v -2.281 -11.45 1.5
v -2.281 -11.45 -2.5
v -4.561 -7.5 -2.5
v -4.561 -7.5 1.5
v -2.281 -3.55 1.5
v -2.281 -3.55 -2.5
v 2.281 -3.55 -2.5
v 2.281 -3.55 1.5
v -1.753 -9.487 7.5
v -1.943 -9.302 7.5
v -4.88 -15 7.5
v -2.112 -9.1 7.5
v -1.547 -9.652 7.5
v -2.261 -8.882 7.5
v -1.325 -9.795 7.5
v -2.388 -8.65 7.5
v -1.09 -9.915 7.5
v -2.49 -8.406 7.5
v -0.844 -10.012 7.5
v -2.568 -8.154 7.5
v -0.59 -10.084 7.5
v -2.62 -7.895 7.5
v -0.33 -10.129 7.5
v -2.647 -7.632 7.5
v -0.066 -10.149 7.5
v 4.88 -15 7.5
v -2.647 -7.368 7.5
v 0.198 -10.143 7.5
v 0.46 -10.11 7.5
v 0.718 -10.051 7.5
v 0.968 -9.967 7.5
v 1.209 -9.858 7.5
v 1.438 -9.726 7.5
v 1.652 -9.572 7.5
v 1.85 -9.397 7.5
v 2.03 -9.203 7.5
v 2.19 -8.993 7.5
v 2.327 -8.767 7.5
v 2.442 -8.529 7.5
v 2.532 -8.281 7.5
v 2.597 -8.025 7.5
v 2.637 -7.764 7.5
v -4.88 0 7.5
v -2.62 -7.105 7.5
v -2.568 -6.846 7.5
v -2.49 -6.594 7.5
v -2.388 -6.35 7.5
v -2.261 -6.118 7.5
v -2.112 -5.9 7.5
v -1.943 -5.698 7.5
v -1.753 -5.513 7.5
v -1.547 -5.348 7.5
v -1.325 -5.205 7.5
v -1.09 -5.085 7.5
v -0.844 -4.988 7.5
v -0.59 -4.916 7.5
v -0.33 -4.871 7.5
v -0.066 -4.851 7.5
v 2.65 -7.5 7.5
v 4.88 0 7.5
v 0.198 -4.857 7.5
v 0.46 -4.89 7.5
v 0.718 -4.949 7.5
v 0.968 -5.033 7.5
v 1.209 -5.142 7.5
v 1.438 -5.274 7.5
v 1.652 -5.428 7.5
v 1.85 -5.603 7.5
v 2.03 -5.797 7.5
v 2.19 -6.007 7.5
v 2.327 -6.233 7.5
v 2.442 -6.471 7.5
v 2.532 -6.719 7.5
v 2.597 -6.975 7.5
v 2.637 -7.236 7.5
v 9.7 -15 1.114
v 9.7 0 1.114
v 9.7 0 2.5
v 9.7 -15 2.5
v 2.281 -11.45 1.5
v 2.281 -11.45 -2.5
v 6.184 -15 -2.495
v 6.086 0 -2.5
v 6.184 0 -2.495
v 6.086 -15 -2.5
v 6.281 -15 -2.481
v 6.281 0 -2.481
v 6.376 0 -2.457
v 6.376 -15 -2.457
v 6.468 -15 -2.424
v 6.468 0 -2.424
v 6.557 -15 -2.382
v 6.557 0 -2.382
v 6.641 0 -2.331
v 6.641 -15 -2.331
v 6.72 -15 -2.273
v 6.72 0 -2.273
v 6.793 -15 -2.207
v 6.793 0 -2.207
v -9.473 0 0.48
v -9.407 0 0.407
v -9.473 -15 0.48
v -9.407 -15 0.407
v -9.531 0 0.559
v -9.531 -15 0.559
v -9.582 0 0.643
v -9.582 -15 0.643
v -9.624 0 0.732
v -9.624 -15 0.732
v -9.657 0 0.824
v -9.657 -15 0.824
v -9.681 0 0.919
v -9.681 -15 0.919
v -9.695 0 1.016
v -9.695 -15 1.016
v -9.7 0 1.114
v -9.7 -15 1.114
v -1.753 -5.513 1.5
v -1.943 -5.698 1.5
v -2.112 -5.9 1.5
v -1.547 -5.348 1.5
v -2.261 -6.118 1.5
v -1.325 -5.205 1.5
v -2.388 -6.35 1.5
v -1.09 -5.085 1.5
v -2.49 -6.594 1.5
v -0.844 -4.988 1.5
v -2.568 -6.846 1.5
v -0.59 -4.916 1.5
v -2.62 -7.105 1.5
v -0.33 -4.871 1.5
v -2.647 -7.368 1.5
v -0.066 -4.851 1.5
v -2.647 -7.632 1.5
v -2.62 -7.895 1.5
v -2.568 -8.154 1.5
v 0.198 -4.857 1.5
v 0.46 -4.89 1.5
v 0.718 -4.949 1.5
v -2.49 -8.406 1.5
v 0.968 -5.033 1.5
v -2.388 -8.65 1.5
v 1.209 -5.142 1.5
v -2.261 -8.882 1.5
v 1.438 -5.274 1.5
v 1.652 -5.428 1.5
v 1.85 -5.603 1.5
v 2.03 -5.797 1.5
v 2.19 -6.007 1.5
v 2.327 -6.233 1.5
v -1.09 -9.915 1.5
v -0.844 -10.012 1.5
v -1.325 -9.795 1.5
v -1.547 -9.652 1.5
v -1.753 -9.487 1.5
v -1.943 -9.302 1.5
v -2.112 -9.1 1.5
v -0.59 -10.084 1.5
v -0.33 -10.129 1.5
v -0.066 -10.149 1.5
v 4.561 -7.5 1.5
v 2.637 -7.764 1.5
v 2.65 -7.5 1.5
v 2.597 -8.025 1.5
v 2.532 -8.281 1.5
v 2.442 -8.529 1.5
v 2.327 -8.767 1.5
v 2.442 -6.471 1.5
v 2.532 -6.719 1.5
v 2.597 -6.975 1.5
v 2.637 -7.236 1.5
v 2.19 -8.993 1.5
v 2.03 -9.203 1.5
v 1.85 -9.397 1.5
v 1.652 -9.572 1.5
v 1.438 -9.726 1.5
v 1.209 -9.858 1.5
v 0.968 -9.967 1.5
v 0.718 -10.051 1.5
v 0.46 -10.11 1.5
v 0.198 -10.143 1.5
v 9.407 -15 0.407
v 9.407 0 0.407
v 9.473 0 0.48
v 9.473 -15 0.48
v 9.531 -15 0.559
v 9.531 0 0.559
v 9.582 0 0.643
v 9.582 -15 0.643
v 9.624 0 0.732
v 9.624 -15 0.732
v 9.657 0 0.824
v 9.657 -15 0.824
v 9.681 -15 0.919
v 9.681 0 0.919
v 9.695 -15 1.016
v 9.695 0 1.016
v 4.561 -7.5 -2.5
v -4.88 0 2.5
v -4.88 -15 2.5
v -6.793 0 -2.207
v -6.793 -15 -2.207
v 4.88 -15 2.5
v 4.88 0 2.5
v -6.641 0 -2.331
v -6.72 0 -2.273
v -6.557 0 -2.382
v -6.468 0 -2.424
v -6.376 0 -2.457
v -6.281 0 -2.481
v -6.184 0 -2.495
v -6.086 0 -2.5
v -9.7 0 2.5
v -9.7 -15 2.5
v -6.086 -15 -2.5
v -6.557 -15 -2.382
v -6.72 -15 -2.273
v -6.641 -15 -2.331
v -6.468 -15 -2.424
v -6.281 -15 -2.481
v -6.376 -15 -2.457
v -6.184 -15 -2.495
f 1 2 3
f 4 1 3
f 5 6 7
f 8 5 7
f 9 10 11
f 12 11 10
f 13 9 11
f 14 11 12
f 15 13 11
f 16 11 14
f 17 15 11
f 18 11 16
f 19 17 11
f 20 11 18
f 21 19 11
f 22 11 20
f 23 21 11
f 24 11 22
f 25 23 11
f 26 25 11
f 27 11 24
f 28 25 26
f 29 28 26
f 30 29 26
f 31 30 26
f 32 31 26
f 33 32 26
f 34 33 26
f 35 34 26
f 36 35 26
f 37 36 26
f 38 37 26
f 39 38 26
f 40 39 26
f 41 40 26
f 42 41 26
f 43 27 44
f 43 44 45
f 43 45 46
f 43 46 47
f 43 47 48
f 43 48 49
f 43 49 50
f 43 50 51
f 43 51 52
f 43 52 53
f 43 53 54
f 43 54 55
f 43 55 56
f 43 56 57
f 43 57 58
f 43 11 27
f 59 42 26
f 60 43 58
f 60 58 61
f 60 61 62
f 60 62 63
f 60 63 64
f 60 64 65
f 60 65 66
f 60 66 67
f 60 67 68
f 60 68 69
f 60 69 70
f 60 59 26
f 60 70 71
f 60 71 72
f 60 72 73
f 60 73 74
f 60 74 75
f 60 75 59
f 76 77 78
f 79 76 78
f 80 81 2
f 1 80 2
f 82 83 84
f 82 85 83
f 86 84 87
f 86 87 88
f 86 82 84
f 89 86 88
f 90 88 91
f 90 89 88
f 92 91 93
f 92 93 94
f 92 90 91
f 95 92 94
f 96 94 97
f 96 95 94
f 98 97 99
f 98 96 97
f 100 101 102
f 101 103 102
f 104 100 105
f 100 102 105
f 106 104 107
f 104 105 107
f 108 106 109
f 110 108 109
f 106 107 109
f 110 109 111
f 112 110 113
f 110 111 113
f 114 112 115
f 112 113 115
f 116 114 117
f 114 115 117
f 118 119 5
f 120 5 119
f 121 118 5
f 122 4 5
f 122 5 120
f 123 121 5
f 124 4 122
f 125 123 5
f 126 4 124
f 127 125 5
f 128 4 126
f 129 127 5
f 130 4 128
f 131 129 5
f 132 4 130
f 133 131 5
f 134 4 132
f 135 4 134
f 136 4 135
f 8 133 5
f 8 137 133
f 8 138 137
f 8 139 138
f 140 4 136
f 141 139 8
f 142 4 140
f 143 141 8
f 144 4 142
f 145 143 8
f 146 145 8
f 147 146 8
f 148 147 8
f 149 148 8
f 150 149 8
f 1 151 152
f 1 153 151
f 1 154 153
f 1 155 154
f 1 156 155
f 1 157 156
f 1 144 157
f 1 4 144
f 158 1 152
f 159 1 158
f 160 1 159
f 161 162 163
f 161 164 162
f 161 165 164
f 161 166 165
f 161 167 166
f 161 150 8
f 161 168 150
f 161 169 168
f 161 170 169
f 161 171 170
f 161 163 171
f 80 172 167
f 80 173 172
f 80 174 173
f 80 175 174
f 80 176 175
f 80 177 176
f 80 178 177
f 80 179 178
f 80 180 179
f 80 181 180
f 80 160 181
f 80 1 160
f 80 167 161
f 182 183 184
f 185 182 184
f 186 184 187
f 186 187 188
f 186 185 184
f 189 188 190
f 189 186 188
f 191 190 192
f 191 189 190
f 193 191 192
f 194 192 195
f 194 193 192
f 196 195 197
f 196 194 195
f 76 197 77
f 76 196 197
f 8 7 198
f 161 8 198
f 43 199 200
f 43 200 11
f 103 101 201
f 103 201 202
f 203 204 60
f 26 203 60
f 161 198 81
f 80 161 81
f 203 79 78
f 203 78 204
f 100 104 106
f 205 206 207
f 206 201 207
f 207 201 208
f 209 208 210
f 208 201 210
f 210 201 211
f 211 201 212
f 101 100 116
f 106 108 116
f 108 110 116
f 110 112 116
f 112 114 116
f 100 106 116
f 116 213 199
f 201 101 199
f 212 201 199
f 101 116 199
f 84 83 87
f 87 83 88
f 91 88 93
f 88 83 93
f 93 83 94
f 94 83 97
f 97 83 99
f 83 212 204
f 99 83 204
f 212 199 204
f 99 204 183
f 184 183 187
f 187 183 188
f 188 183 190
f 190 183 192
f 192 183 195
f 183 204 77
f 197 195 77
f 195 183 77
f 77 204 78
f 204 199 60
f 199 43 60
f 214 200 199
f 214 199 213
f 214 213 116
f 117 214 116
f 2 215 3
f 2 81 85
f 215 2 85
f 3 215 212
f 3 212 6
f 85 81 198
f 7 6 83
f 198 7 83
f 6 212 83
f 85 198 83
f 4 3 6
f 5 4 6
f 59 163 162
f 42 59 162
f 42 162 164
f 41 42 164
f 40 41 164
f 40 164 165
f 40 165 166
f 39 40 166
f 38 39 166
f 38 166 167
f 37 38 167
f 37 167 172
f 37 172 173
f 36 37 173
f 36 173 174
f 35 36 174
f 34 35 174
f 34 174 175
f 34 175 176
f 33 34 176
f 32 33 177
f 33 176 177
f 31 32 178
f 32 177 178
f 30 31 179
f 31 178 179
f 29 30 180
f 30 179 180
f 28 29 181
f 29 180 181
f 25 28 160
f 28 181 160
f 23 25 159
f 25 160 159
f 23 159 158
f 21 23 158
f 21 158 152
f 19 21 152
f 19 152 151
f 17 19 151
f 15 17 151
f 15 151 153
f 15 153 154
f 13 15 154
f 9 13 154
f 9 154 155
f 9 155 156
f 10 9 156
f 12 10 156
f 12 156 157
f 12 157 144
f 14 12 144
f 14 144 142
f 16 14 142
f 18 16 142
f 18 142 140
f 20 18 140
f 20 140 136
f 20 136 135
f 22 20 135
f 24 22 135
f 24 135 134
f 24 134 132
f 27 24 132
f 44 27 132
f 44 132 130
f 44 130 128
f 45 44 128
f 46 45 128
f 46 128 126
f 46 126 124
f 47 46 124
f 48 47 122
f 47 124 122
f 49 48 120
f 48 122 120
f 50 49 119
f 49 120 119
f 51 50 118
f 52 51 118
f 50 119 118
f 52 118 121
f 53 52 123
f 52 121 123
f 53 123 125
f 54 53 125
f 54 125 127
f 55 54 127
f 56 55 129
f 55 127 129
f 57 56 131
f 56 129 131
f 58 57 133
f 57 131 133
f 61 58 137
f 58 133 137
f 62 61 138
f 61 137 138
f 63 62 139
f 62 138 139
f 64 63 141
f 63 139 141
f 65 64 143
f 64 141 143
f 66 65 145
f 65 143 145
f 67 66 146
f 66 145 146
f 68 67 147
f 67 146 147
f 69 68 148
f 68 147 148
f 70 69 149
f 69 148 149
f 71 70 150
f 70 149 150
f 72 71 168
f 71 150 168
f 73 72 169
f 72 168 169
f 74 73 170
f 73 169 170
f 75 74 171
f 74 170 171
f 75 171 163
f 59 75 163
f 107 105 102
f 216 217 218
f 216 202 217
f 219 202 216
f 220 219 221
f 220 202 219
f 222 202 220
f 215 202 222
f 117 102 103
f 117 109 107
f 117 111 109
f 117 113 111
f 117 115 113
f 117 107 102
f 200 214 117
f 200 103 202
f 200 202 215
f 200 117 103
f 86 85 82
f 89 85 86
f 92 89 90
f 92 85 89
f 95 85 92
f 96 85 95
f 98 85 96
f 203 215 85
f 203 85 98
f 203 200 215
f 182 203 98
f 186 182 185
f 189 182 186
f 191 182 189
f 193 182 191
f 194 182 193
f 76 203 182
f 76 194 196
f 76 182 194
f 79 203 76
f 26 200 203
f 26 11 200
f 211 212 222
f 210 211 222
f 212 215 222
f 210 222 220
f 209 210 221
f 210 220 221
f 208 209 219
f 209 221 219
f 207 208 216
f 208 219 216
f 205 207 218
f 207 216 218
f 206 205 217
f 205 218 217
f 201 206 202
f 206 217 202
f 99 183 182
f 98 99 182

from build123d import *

# Parameters (mm, degrees)
F0_W     = 9.76
F0_H     = 5
F1_DEPTH = 15
F2_SIZE  = 3.2
F3_R     = 2.65
F4_DEPTH = 10.001
F5_DEPTH = 4
F6_R     = 1


with BuildPart() as f1:
    # F0 (on Front) → F1 (new body)
    with BuildSketch(Plane.XZ):
        Polygon((-9.7, -2.5), (9.7, -2.5), (9.7, 2.5), (4.88, 2.5), (-4.88, 2.5), (-9.7, 2.5), align=None)
        with Locations((0, 5)):
            Rectangle(F0_W, F0_H)
    extrude(amount=F1_DEPTH)

    # F2
    f2_edges = [f1.edges().sort_by_distance(p)[0] for p in [
        (9.7, -7.5, -2.5),
        (-9.7, -7.5, -2.5),
    ]]
    chamfer(f2_edges, length=F2_SIZE)

    # F3 (on face) → F4 (cut, through all)
    with BuildSketch(Plane(origin=(0, 0, -2.5), x_dir=(1, 0, 0), z_dir=(0, 0, -1))):
        with Locations((0, 7.5)):
            Circle(F3_R)
    extrude(amount=-F4_DEPTH, mode=Mode.SUBTRACT)

    # F3 (on face) → F5 (cut)
    with BuildSketch(Plane(origin=(0, 0, -2.5), x_dir=(1, 0, 0), z_dir=(0, 0, -1))):
        Polygon((-2.2805335633, 3.55), (2.2805335633, 3.55), (4.5610671266, 7.5), (2.2805335633, 11.45), (-2.2805335633, 11.45), (-4.5610671266, 7.5), align=None)
        with Locations((0, 7.5)):
            Circle(F3_R, mode=Mode.SUBTRACT)
    extrude(amount=-F5_DEPTH, mode=Mode.SUBTRACT)

    # F6
    f6_edges = [f1.edges().sort_by_distance(p)[0] for p in [
        (-6.5, -7.5, -2.5),
        (6.5, -7.5, -2.5),
        (9.7, -7.5, 0.7),
        (-9.7, -7.5, 0.7),
    ]]
    fillet(f6_edges, radius=F6_R)


solid = f1.part
